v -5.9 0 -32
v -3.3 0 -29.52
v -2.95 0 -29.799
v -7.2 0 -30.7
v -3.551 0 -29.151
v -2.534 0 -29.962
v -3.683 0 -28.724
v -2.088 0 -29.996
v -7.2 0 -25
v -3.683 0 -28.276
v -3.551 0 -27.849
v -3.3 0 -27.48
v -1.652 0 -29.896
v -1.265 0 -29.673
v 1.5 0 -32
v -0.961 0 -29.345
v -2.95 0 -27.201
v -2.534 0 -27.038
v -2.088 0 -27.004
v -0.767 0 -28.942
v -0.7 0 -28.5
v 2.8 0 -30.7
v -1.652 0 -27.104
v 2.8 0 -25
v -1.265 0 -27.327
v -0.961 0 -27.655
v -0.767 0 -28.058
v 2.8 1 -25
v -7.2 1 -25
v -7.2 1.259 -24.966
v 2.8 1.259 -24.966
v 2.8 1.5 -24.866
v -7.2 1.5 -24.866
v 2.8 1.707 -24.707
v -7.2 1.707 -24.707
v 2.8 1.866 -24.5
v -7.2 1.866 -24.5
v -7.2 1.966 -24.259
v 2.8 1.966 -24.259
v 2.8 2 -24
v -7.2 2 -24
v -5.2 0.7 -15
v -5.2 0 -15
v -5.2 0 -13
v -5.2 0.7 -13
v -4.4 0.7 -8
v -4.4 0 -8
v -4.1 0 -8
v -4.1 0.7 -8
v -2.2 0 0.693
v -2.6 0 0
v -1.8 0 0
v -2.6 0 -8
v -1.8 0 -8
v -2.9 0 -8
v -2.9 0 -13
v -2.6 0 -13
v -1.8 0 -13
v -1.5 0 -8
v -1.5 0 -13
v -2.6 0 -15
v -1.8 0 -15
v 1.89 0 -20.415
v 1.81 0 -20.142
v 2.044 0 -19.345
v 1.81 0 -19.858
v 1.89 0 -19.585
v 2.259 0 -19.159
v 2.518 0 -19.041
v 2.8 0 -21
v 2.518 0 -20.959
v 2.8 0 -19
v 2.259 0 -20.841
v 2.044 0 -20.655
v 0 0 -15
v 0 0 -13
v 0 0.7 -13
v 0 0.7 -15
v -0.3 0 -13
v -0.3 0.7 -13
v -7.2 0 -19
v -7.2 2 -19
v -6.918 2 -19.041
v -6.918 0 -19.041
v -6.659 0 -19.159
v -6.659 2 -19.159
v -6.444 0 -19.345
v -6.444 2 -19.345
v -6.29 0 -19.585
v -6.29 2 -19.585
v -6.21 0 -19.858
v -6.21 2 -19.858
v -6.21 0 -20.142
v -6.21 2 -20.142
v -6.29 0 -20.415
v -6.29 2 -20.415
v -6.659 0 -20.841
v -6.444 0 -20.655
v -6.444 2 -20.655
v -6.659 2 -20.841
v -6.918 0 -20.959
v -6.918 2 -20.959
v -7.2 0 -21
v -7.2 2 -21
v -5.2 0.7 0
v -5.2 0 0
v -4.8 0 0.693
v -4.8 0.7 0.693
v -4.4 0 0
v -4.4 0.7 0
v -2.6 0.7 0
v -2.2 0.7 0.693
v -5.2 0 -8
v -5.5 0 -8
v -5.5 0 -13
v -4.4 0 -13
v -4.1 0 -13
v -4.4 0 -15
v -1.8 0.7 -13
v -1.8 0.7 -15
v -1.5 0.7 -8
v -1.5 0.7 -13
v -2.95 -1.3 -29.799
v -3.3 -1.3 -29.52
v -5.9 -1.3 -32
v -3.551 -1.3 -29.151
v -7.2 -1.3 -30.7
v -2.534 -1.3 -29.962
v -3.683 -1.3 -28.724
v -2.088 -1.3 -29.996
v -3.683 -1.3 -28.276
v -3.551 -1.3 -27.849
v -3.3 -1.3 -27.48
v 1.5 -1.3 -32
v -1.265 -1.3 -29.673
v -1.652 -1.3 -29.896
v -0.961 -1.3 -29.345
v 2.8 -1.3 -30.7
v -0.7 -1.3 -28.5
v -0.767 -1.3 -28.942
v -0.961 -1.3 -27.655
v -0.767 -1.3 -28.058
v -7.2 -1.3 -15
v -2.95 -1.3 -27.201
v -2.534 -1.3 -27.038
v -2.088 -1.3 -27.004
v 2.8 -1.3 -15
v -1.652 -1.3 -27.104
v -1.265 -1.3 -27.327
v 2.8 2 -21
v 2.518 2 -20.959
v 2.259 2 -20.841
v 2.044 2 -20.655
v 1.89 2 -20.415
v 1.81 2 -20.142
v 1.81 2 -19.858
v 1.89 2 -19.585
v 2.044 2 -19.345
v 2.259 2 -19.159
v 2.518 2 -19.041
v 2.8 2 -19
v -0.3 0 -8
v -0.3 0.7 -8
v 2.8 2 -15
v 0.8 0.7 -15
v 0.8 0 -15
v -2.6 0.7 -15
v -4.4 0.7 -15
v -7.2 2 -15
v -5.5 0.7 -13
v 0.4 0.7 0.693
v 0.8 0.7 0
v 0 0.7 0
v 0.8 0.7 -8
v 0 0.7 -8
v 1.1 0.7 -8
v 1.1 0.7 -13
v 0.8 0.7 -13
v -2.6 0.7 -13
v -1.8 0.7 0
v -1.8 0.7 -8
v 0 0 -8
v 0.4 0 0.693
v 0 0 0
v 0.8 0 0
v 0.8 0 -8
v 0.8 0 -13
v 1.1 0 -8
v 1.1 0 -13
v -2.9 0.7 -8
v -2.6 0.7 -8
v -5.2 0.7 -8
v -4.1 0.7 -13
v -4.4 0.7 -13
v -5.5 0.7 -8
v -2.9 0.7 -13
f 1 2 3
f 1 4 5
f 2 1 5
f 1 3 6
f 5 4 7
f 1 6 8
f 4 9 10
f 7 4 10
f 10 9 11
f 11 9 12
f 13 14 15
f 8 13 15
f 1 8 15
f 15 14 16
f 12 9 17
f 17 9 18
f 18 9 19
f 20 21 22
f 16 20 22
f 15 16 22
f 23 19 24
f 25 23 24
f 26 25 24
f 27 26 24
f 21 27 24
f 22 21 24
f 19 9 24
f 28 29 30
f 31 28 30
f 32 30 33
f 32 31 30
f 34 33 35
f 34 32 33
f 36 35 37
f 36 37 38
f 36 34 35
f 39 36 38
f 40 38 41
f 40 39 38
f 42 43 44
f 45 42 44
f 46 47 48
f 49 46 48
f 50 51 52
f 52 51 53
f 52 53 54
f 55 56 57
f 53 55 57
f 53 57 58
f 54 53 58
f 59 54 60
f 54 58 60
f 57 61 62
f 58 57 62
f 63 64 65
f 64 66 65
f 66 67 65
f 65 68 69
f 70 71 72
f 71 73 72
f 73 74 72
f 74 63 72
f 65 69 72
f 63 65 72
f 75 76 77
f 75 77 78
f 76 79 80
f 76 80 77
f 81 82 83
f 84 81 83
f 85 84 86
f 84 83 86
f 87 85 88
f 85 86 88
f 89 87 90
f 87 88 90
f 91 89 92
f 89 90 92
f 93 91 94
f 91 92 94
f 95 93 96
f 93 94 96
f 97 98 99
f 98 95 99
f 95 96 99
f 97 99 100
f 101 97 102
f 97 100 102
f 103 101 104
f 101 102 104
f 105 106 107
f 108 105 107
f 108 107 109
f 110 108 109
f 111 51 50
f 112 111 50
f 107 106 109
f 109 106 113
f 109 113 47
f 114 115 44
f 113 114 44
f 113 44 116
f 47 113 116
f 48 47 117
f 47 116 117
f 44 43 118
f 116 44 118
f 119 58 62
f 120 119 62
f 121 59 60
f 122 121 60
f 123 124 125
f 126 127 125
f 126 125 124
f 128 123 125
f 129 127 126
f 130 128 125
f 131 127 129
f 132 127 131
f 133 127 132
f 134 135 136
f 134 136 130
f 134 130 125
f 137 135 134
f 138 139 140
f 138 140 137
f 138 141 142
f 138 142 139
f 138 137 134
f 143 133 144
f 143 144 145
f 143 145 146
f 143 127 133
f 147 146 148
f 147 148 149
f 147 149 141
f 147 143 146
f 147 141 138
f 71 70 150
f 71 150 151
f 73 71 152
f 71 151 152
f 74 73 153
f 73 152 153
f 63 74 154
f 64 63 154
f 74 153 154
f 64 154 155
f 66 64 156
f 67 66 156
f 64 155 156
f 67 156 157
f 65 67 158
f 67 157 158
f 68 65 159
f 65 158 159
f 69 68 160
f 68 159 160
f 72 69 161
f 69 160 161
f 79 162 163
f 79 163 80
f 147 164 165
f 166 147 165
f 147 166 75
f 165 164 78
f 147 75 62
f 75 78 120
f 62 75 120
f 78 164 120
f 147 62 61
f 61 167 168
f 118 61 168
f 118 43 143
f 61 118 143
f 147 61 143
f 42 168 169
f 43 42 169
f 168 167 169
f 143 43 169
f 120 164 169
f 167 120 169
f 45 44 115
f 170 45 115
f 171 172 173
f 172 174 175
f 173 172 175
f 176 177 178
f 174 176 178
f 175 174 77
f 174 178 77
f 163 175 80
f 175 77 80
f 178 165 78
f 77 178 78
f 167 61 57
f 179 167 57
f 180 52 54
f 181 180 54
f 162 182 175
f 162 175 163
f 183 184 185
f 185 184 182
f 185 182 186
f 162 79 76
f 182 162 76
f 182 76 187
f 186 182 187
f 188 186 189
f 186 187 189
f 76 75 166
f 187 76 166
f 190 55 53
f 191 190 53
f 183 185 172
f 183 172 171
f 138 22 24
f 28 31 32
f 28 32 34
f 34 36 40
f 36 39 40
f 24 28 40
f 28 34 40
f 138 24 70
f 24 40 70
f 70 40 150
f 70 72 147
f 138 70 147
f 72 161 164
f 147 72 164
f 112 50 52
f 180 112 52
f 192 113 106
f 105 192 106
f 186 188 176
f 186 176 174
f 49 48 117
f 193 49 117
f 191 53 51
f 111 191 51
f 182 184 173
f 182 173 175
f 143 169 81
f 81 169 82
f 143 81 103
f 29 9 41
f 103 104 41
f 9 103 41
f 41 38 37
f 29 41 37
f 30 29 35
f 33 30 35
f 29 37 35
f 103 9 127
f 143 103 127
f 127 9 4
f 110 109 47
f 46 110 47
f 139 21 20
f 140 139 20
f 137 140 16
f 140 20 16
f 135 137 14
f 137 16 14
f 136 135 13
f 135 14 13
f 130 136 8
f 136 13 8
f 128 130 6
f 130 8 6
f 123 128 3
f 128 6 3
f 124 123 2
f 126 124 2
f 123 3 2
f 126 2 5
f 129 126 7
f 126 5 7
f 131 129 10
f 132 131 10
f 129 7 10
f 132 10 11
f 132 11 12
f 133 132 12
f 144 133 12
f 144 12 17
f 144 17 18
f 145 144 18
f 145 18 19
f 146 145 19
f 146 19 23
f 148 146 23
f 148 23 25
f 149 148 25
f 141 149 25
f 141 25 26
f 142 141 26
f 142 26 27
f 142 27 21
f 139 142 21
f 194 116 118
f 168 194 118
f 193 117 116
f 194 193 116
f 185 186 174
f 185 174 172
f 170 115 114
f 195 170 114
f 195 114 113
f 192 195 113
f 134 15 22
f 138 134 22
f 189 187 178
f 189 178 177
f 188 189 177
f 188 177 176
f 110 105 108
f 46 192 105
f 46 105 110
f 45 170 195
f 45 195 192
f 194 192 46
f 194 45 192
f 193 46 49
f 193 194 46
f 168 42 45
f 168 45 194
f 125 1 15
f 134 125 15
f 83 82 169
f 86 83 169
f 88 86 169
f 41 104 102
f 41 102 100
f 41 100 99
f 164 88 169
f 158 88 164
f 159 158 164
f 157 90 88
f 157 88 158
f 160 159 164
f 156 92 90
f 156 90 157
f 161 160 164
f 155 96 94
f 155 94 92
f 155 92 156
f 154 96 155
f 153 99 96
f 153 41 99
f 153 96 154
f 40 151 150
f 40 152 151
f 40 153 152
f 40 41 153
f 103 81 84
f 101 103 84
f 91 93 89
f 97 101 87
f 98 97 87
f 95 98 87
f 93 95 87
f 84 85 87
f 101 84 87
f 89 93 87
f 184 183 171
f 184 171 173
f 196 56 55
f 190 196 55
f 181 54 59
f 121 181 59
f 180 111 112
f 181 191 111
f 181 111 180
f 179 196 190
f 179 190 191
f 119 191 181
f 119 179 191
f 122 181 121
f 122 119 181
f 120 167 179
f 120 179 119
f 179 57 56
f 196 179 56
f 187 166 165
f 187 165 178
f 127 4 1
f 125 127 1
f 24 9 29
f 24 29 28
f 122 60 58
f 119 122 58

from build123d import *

# Parameters (mm, degrees)
BOSS_EXTRUDE1_DEPTH   = 0.7
BOSS_EXTRUDE1_2_DEPTH = 0.7
BOSS_EXTRUDE1_3_DEPTH = 0.7
SKETCH2_W             = 10
SKETCH2_H             = 10
BOSS_EXTRUDE2_DEPTH   = 2
FILLET1_R             = 1
SKETCH3_R             = 1
CUT_EXTRUDE1_DEPTH    = 2
BOSS_EXTRUDE3_DEPTH   = 1.3
SKETCH5_R             = 1.5
CUT_EXTRUDE2_DEPTH    = 2.3


with BuildPart() as part:
    # Sketch1 → Boss-Extrude1 (new body)
    with BuildSketch(Plane(origin=(0, 0, 0), x_dir=(1, 0, 0), z_dir=(0, 1, 0))):
        Polygon((0, 0), (0, 8), (-0.3, 8), (-0.3, 13), (0, 13), (0, 15), (0.8, 15), (0.8, 13), (1.1, 13), (1.1, 8), (0.8, 8), (0.8, 0), (0.4, -0.692820323), align=None)
    extrude(amount=BOSS_EXTRUDE1_DEPTH)



with BuildPart() as body_2:
    # Sketch1 → Boss-Extrude1 2 (new body)
    with BuildSketch(Plane(origin=(0, 0, 0), x_dir=(1, 0, 0), z_dir=(0, 1, 0))):
        Polygon((-1.8, 15), (-2.6, 15), (-2.6, 13), (-2.9, 13), (-2.9, 8), (-2.6, 8), (-2.6, 0), (-2.2, -0.692820323), (-1.8, 0), (-1.8, 8), (-1.5, 8), (-1.5, 13), (-1.8, 13), align=None)
    extrude(amount=BOSS_EXTRUDE1_2_DEPTH)


with BuildPart() as body_3:
    # Sketch1 → Boss-Extrude1 3 (new body)
    with BuildSketch(Plane(origin=(0, 0, 0), x_dir=(1, 0, 0), z_dir=(0, 1, 0))):
        Polygon((-5.5, 13), (-5.5, 8), (-5.2, 8), (-5.2, 0), (-4.8, -0.692820323), (-4.4, 0), (-4.4, 8), (-4.1, 8), (-4.1, 13), (-4.4, 13), (-4.4, 15), (-5.2, 15), (-5.2, 13), align=None)
    extrude(amount=BOSS_EXTRUDE1_3_DEPTH)


with BuildPart() as part_1:
    add(part.part)

    add(body_2.part)  # Boss-Extrude2 merges body 2

    add(body_3.part)  # Boss-Extrude2 merges body 3
    # Sketch2 → Boss-Extrude2 (add)
    with BuildSketch(Plane(origin=(0, 0, 0), x_dir=(1, 0, 0), z_dir=(0, 1, 0))):
        with Locations((-2.2, 20)):
            Rectangle(SKETCH2_W, SKETCH2_H)
    extrude(amount=BOSS_EXTRUDE2_DEPTH)

    # Fillet1
    fillet1_edges = [part_1.edges().sort_by_distance(p)[0] for p in [
        (-2.2, 2, -25),
    ]]
    fillet(fillet1_edges, radius=FILLET1_R)

    # Sketch3 → Cut-Extrude1 (cut)
    with BuildSketch(Plane(origin=(0, 2, 0), x_dir=(1, 0, 0), z_dir=(0, 1, 0))):
        with Locations((-7.2, 20)):
            Circle(SKETCH3_R)
        with Locations((2.8, 20)):
            Circle(SKETCH3_R)
    extrude(amount=-CUT_EXTRUDE1_DEPTH, mode=Mode.SUBTRACT)

    # Sketch4 → Boss-Extrude3 (add)
    with BuildSketch(Plane.XZ):
        Polygon((-7.2, -30.7), (-5.9, -32), (1.5, -32), (2.8, -30.7), (2.8, -15), (-7.2, -15), align=None)
    extrude(amount=BOSS_EXTRUDE3_DEPTH)

    # Sketch5 → Cut-Extrude2 (cut, through all)
    with BuildSketch(Plane(origin=(0, 0, 0), x_dir=(1, 0, 0), z_dir=(0, 1, 0))):
        with Locations((-2.2, 28.5)):
            Circle(SKETCH5_R)
    extrude(amount=-CUT_EXTRUDE2_DEPTH, mode=Mode.SUBTRACT)


solid = part_1.part
